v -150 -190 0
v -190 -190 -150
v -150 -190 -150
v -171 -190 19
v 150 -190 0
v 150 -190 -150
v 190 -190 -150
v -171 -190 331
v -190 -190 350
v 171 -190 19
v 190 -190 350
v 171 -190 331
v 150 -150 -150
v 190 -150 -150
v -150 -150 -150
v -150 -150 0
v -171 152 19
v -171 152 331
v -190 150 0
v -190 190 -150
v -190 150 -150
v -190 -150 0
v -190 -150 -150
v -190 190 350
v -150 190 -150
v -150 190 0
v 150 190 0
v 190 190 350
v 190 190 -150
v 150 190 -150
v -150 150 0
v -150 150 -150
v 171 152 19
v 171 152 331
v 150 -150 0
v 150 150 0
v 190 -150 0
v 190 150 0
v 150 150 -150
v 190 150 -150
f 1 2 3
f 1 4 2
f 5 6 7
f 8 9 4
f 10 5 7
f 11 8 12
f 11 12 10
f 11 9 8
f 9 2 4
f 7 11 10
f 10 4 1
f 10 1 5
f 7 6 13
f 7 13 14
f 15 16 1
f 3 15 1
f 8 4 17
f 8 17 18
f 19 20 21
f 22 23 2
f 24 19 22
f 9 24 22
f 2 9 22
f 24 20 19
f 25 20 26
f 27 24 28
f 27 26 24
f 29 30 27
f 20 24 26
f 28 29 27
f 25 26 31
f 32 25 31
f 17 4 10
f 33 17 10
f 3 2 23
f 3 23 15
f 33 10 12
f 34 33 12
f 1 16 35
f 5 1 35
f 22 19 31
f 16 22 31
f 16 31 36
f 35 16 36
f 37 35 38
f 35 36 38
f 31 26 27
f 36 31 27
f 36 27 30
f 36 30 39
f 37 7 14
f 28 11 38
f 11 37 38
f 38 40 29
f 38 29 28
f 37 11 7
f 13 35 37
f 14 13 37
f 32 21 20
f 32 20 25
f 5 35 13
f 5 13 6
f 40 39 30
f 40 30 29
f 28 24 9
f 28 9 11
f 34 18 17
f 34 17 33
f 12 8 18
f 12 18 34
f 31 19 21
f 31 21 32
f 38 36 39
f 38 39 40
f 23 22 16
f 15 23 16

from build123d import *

# Parameters (mm, degrees)
F0_W     = 380
F0_H     = 380
F1_DEPTH = 350
F2_W     = 342
F2_H     = 312
F3_DEPTH = 342
F4_W     = 40
F4_H     = 40
F5_DEPTH = 150


with BuildPart() as f1:
    # F0 (on Top) → F1 (new body)
    with BuildSketch(Plane.XY):
        Rectangle(F0_W, F0_H)
    extrude(amount=F1_DEPTH)

    # F2 (on face) → F3 (cut)
    with BuildSketch(Plane.XZ.offset(190)):
        with Locations((0, 175)):
            Rectangle(F2_W, F2_H)
    extrude(amount=-F3_DEPTH, mode=Mode.SUBTRACT)

    # F4 (on face) → F5 (join)
    with BuildSketch(Plane(origin=(0, 0, 0), x_dir=(1, 0, 0), z_dir=(0, 0, -1))):
        with Locations((-170, 170)):
            Rectangle(F4_W, F4_H)
        with Locations((170, 170)):
            Rectangle(F4_W, F4_H)
        with Locations((170, -170)):
            Rectangle(F4_W, F4_H)
        with Locations((-170, -170)):
            Rectangle(F4_W, F4_H)
    extrude(amount=F5_DEPTH)


solid = f1.part
